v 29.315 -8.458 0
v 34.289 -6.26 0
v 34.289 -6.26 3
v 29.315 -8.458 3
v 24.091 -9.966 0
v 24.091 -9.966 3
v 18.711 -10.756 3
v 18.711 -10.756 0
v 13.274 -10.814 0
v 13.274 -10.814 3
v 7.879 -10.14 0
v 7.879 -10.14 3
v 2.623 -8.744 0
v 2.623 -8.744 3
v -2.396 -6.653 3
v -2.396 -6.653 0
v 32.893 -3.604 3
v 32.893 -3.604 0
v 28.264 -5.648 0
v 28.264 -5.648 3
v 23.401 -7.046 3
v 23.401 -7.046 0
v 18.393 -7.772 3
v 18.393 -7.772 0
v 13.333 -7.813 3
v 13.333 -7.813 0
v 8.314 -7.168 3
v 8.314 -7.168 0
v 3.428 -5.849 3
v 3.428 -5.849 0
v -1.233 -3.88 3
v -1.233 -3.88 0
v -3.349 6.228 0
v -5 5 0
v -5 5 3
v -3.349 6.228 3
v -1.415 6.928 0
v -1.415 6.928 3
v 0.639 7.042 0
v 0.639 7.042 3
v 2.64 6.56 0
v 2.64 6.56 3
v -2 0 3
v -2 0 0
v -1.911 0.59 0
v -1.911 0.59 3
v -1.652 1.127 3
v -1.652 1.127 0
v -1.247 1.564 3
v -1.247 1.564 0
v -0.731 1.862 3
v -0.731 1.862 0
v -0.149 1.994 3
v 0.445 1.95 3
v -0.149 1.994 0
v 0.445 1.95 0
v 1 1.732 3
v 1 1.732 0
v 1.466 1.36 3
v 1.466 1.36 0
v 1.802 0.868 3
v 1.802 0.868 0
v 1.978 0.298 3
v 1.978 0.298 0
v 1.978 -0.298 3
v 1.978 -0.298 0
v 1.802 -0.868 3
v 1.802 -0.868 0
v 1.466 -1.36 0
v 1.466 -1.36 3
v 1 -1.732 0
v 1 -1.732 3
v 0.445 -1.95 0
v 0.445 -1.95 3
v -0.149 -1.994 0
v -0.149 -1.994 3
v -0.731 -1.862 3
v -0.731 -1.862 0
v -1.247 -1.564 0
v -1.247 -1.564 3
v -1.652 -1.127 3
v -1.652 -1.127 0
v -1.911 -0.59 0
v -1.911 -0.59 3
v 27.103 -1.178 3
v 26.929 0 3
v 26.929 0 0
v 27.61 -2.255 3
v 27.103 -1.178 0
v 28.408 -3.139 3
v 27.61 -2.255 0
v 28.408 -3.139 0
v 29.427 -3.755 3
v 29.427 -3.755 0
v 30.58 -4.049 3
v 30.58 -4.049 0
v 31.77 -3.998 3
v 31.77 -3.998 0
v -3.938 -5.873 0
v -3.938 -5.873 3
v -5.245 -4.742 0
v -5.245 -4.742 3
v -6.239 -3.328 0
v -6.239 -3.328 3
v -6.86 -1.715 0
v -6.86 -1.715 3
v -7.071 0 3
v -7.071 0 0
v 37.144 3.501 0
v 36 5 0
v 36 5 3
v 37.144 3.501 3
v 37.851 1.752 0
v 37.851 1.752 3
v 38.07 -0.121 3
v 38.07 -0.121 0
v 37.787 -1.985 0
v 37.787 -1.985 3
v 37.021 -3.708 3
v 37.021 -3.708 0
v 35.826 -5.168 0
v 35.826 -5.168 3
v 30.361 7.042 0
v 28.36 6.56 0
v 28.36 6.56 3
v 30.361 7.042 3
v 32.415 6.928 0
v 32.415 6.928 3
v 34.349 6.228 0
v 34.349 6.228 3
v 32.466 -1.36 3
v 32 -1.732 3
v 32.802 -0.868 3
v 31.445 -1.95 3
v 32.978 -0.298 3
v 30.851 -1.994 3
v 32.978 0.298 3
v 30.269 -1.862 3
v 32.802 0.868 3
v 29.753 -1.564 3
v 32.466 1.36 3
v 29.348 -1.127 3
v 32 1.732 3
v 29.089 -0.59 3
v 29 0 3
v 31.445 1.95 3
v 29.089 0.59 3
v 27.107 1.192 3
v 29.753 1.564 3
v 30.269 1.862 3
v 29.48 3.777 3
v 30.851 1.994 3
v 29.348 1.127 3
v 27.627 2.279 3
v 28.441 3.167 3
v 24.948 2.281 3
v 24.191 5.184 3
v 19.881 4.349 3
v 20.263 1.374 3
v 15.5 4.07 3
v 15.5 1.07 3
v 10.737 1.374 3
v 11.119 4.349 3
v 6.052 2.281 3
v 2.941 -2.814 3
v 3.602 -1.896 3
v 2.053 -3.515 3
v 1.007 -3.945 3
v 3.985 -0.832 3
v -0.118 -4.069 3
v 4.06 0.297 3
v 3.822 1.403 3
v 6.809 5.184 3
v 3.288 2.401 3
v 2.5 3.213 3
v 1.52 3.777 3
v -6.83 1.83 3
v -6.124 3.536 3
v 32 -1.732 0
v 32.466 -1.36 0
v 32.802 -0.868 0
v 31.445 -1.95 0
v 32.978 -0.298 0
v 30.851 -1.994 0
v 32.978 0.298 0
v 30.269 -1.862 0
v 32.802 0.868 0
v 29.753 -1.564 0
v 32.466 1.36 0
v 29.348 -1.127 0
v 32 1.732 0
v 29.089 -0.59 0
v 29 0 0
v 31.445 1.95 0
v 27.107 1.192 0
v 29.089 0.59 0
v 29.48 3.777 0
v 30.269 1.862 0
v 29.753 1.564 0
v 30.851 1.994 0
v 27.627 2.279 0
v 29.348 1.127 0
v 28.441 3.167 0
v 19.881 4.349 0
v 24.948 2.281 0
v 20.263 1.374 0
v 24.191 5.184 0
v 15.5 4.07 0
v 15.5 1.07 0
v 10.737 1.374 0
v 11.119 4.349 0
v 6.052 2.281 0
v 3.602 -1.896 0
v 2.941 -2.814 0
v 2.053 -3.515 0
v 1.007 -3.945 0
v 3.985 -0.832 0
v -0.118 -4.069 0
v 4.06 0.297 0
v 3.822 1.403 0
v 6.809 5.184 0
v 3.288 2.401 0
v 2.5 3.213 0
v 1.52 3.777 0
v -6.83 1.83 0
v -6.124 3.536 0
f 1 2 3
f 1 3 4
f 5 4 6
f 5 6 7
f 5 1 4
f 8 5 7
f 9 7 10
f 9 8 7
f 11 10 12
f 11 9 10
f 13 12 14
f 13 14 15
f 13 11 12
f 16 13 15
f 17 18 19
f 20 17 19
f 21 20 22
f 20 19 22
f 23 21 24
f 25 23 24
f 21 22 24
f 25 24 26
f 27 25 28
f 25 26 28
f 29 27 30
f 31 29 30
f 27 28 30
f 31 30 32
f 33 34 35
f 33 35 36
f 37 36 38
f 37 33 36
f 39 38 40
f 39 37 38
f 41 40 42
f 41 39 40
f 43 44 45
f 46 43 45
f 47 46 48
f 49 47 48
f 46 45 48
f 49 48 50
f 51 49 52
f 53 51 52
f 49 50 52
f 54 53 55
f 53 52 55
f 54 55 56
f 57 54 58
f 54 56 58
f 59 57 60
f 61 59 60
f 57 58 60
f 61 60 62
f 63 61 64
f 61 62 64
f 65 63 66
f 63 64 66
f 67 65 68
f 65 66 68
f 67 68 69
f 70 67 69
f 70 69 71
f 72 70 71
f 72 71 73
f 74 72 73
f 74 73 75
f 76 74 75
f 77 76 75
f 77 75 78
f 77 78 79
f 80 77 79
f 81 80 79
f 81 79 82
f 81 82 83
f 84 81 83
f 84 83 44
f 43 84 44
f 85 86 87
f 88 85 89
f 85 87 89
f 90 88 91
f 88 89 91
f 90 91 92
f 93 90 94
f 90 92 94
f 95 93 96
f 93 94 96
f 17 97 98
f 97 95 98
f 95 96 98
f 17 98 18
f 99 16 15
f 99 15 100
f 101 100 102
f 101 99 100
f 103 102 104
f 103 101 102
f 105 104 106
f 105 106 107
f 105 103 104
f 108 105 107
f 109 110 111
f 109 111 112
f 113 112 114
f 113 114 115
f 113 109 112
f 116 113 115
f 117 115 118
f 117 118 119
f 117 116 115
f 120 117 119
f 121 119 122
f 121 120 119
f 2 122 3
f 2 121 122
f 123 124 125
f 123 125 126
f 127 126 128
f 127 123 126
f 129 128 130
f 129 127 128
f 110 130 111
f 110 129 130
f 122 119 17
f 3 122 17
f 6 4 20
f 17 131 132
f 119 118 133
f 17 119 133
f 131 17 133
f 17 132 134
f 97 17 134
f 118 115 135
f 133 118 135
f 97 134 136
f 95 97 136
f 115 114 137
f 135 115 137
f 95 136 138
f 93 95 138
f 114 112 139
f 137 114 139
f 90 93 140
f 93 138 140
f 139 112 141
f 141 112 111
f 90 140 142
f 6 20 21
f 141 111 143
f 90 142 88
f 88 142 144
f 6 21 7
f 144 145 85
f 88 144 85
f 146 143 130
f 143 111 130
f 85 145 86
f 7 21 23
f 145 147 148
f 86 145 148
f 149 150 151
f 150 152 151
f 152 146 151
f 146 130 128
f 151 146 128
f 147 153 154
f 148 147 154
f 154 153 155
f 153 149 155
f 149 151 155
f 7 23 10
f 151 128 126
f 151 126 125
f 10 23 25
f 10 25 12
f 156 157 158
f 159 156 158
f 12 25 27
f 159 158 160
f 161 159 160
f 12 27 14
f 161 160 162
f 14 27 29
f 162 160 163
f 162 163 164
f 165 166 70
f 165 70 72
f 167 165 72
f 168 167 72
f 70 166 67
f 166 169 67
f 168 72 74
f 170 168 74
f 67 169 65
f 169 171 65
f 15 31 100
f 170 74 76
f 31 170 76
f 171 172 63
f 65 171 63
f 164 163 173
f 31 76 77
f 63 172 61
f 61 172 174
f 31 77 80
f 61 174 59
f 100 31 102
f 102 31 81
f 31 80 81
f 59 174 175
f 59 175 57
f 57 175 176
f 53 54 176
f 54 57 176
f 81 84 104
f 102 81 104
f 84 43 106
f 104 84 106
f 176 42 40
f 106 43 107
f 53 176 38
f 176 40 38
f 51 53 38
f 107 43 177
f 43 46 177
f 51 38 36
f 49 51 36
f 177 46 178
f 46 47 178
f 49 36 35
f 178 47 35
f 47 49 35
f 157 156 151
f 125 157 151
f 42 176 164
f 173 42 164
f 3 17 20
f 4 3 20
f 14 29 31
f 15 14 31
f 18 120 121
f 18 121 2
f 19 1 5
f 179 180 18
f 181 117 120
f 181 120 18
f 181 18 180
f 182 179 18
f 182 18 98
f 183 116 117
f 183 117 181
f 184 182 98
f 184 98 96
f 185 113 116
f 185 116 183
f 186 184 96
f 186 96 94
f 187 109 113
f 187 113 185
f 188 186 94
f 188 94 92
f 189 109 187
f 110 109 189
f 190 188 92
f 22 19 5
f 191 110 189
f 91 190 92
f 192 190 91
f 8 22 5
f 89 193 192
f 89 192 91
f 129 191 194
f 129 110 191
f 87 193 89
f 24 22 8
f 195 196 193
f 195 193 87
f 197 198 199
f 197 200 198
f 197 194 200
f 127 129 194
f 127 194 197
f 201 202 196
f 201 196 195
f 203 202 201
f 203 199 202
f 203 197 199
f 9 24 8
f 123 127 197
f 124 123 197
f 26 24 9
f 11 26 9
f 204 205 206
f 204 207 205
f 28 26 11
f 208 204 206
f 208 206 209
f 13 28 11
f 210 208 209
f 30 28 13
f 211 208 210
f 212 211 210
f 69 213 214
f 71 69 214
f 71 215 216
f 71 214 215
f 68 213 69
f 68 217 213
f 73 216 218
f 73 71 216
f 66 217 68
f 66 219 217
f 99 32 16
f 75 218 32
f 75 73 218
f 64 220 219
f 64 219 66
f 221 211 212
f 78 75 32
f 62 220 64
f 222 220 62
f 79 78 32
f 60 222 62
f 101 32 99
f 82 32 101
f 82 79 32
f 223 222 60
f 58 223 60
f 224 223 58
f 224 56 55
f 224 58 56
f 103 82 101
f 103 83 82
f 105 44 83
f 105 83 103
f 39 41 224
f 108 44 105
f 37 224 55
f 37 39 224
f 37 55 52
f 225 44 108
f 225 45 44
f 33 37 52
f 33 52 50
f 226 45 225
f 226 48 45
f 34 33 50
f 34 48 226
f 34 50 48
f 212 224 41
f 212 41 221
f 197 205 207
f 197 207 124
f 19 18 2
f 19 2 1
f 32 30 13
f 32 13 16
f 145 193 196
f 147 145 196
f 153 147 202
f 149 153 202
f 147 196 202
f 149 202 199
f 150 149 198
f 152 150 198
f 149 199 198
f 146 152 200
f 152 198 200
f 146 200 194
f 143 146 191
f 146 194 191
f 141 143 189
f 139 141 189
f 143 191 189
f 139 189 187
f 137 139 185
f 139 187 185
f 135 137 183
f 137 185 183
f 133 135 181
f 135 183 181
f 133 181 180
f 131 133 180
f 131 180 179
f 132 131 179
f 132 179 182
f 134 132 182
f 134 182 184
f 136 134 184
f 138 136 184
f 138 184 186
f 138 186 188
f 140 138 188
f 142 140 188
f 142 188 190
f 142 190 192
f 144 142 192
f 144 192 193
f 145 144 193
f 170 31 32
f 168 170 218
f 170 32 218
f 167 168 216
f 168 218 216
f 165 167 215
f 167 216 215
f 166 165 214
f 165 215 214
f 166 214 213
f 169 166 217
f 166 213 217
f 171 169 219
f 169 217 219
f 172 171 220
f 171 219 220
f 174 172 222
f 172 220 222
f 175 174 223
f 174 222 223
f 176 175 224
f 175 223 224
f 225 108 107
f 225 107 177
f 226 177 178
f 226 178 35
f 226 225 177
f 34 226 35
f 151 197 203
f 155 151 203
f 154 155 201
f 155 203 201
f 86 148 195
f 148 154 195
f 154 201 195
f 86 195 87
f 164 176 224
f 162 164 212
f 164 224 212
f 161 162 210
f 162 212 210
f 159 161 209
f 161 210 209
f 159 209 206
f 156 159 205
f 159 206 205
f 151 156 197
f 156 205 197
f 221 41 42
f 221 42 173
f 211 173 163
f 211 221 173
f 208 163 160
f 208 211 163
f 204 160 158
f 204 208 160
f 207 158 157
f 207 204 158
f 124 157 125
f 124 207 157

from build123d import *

# Parameters (mm, degrees)
SKETCH1_R           = 1.5
EXTRUDE1_DEPTH      = 3
BOSS_EXTRUDE2_START = -3
BOSS_EXTRUDE2_DEPTH = 3
CUT_EXTRUDE4_START  = -5
CUT_EXTRUDE4_DEPTH  = 5
BOSS_EXTRUDE3_DEPTH = 3
BOSS_EXTRUDE4_DEPTH = 3
SKETCH7_R           = 2
CUT_EXTRUDE6_DEPTH  = 5


with BuildPart() as part:
    # Sketch1 → Extrude1 (new body)
    with BuildSketch(Plane.XY):
        with BuildLine():
            ThreePointArc((0, 5), (-5, 0), (0, -5))
            Line((0, -5), (31, -5))
            ThreePointArc((31, -5), (36, 0), (31, 5))
            Line((31, 5), (0, 5))
        make_face()
        Circle(SKETCH1_R, mode=Mode.SUBTRACT)
        with BuildLine():
            ThreePointArc((32.5, 0), (31, -1.5), (29.5, 0))
            ThreePointArc((29.5, 0), (31, 1.5), (32.5, 0))
        make_face(mode=Mode.SUBTRACT)
    extrude(amount=EXTRUDE1_DEPTH)

    # Sketch2 → Boss-Extrude2 (add)
    with BuildSketch(Plane.XY.offset(3).offset(BOSS_EXTRUDE2_START)):
        with BuildLine():
            Line((30.833786225, -5), (0.166213775, -5))
            ThreePointArc((0.166213775, -5), (15.5, -10), (30.833786225, -5))
        make_face()
        with BuildLine():
            ThreePointArc((36, 0), (36, 5), (31, 5))
            ThreePointArc((31, 5), (34.535533906, 3.535533906), (36, 0))
        make_face()
        with BuildLine():
            ThreePointArc((-5, 0), (-3.535533906, 3.535533906), (0, 5))
            ThreePointArc((0, 5), (-5, 5), (-5, 0))
        make_face()
    extrude(amount=BOSS_EXTRUDE2_DEPTH)

    # Sketch2<6> → Cut-Extrude4 (cut)
    with BuildSketch(Plane.XY.offset(3).offset(CUT_EXTRUDE4_START)):
        with BuildLine():
            Line((31, 5), (0, 5))
            ThreePointArc((0, 5), (15.5, -1.27314911), (31, 5))
        make_face()
        with BuildLine():
            ThreePointArc((31, -5), (34.535533906, -3.535533906), (36, 0))
            ThreePointArc((36, 0), (33.590468728, -2.679345747), (30.833786225, -5))
            Line((30.833786225, -5), (31, -5))
        make_face()
        with BuildLine():
            ThreePointArc((0.166213775, -5), (-2.590468728, -2.679345747), (-5, 0))
            ThreePointArc((-5, 0), (-3.535533906, -3.535533906), (0, -5))
            Line((0, -5), (0.166213775, -5))
        make_face()
    extrude(amount=CUT_EXTRUDE4_DEPTH, mode=Mode.SUBTRACT)

    # Sketch5 → Boss-Extrude3 (add)
    with BuildSketch(Plane(origin=(0, 0, 0), x_dir=(-1, 0, 0), z_dir=(0, 0, -1))):
        with BuildLine():
            ThreePointArc((-2.599706958, -6.575828749), (5.911032444, -3.880682343), (4.999999984, 5.000000016))
            ThreePointArc((4.999999984, 5.000000016), (6.035533906, 2.500000011), (5, 0))
            ThreePointArc((5, 0), (1.520730735, -3.658414607), (-2.599706958, -6.575828749))
        make_face()
        with BuildLine():
            ThreePointArc((0, 5), (2.499999989, 6.035533906), (4.999999984, 5.000000016))
            ThreePointArc((4.999999984, 5.000000016), (-2.526282139, 6.604384797), (-7.06048758, 0.386671862))
            ThreePointArc((-7.06048758, 0.386671862), (-3.310013829, 2.356284055), (0, 5))
        make_face()
        with BuildLine():
            ThreePointArc((-36.000000042, 4.999999958), (-36.911032421, -3.880682377), (-28.400293042, -6.575828749))
            ThreePointArc((-28.400293042, -6.575828749), (-32.520730735, -3.658414607), (-36, 0))
            ThreePointArc((-36, 0), (-37.035533906, 2.499999971), (-36.000000042, 4.999999958))
        make_face()
        with BuildLine():
            ThreePointArc((-31, 5), (-27.689986171, 2.356284055), (-23.93951242, 0.386671862))
            ThreePointArc((-23.93951242, 0.386671862), (-28.473717899, 6.604384812), (-36.000000042, 4.999999958))
            ThreePointArc((-36.000000042, 4.999999958), (-33.500000029, 6.035533906), (-31, 5))
        make_face()
    extrude(amount=-BOSS_EXTRUDE3_DEPTH)

    # Sketch6 → Boss-Extrude4 (add)
    with BuildSketch(Plane(origin=(0, 0, 0), x_dir=(-1, 0, 0), z_dir=(0, 0, -1))):
        with BuildLine():
            ThreePointArc((-7.06048758, 0.386671862), (-5.748903613, 4.117050795), (-2.639524867, 6.559947292))
            ThreePointArc((-2.639524867, 6.559947292), (-15.5, 4.069630639), (-28.360475133, 6.559947292))
            ThreePointArc((-28.360475133, 6.559947292), (-25.251096387, 4.117050795), (-23.93951242, 0.386671862))
            ThreePointArc((-23.93951242, 0.386671862), (-15.5, -1.27314911), (-7.06048758, 0.386671862))
        make_face()
        with BuildLine():
            ThreePointArc((-34.288674296, -6.259762086), (-15.993644495, -10.877173454), (2.396097668, -6.652722448))
            ThreePointArc((2.396097668, -6.652722448), (-0.108822543, -7.070230382), (-2.599706958, -6.575828749))
            ThreePointArc((-2.599706958, -6.575828749), (-15.5, -10), (-28.400293042, -6.575828749))
            ThreePointArc((-28.400293042, -6.575828749), (-31.379003341, -7.060903375), (-34.288674296, -6.259762086))
        make_face()
    extrude(amount=-BOSS_EXTRUDE4_DEPTH)

    # Sketch7 → Cut-Extrude6 (cut)
    with BuildSketch(Plane(origin=(0, 0, 0), x_dir=(-1, 0, 0), z_dir=(0, 0, -1))):
        Circle(SKETCH7_R)
        with Locations((-31, 0)):
            Circle(SKETCH7_R)
        with BuildLine():
            ThreePointArc((-29.480330692, 3.776797363), (-27.304888135, -1.70872509), (-32.893407958, -3.603969954))
            ThreePointArc((-32.893407958, -3.603969954), (-15.863554262, -7.878266077), (1.233165938, -3.879806039))
            ThreePointArc((1.233165938, -3.879806039), (-3.83098094, -1.377380909), (-1.519669308, 3.776797363))
            ThreePointArc((-1.519669308, 3.776797363), (-15.5, 1.069630639), (-29.480330692, 3.776797363))
        make_face()
    extrude(amount=-CUT_EXTRUDE6_DEPTH, mode=Mode.SUBTRACT)


solid = part.part
